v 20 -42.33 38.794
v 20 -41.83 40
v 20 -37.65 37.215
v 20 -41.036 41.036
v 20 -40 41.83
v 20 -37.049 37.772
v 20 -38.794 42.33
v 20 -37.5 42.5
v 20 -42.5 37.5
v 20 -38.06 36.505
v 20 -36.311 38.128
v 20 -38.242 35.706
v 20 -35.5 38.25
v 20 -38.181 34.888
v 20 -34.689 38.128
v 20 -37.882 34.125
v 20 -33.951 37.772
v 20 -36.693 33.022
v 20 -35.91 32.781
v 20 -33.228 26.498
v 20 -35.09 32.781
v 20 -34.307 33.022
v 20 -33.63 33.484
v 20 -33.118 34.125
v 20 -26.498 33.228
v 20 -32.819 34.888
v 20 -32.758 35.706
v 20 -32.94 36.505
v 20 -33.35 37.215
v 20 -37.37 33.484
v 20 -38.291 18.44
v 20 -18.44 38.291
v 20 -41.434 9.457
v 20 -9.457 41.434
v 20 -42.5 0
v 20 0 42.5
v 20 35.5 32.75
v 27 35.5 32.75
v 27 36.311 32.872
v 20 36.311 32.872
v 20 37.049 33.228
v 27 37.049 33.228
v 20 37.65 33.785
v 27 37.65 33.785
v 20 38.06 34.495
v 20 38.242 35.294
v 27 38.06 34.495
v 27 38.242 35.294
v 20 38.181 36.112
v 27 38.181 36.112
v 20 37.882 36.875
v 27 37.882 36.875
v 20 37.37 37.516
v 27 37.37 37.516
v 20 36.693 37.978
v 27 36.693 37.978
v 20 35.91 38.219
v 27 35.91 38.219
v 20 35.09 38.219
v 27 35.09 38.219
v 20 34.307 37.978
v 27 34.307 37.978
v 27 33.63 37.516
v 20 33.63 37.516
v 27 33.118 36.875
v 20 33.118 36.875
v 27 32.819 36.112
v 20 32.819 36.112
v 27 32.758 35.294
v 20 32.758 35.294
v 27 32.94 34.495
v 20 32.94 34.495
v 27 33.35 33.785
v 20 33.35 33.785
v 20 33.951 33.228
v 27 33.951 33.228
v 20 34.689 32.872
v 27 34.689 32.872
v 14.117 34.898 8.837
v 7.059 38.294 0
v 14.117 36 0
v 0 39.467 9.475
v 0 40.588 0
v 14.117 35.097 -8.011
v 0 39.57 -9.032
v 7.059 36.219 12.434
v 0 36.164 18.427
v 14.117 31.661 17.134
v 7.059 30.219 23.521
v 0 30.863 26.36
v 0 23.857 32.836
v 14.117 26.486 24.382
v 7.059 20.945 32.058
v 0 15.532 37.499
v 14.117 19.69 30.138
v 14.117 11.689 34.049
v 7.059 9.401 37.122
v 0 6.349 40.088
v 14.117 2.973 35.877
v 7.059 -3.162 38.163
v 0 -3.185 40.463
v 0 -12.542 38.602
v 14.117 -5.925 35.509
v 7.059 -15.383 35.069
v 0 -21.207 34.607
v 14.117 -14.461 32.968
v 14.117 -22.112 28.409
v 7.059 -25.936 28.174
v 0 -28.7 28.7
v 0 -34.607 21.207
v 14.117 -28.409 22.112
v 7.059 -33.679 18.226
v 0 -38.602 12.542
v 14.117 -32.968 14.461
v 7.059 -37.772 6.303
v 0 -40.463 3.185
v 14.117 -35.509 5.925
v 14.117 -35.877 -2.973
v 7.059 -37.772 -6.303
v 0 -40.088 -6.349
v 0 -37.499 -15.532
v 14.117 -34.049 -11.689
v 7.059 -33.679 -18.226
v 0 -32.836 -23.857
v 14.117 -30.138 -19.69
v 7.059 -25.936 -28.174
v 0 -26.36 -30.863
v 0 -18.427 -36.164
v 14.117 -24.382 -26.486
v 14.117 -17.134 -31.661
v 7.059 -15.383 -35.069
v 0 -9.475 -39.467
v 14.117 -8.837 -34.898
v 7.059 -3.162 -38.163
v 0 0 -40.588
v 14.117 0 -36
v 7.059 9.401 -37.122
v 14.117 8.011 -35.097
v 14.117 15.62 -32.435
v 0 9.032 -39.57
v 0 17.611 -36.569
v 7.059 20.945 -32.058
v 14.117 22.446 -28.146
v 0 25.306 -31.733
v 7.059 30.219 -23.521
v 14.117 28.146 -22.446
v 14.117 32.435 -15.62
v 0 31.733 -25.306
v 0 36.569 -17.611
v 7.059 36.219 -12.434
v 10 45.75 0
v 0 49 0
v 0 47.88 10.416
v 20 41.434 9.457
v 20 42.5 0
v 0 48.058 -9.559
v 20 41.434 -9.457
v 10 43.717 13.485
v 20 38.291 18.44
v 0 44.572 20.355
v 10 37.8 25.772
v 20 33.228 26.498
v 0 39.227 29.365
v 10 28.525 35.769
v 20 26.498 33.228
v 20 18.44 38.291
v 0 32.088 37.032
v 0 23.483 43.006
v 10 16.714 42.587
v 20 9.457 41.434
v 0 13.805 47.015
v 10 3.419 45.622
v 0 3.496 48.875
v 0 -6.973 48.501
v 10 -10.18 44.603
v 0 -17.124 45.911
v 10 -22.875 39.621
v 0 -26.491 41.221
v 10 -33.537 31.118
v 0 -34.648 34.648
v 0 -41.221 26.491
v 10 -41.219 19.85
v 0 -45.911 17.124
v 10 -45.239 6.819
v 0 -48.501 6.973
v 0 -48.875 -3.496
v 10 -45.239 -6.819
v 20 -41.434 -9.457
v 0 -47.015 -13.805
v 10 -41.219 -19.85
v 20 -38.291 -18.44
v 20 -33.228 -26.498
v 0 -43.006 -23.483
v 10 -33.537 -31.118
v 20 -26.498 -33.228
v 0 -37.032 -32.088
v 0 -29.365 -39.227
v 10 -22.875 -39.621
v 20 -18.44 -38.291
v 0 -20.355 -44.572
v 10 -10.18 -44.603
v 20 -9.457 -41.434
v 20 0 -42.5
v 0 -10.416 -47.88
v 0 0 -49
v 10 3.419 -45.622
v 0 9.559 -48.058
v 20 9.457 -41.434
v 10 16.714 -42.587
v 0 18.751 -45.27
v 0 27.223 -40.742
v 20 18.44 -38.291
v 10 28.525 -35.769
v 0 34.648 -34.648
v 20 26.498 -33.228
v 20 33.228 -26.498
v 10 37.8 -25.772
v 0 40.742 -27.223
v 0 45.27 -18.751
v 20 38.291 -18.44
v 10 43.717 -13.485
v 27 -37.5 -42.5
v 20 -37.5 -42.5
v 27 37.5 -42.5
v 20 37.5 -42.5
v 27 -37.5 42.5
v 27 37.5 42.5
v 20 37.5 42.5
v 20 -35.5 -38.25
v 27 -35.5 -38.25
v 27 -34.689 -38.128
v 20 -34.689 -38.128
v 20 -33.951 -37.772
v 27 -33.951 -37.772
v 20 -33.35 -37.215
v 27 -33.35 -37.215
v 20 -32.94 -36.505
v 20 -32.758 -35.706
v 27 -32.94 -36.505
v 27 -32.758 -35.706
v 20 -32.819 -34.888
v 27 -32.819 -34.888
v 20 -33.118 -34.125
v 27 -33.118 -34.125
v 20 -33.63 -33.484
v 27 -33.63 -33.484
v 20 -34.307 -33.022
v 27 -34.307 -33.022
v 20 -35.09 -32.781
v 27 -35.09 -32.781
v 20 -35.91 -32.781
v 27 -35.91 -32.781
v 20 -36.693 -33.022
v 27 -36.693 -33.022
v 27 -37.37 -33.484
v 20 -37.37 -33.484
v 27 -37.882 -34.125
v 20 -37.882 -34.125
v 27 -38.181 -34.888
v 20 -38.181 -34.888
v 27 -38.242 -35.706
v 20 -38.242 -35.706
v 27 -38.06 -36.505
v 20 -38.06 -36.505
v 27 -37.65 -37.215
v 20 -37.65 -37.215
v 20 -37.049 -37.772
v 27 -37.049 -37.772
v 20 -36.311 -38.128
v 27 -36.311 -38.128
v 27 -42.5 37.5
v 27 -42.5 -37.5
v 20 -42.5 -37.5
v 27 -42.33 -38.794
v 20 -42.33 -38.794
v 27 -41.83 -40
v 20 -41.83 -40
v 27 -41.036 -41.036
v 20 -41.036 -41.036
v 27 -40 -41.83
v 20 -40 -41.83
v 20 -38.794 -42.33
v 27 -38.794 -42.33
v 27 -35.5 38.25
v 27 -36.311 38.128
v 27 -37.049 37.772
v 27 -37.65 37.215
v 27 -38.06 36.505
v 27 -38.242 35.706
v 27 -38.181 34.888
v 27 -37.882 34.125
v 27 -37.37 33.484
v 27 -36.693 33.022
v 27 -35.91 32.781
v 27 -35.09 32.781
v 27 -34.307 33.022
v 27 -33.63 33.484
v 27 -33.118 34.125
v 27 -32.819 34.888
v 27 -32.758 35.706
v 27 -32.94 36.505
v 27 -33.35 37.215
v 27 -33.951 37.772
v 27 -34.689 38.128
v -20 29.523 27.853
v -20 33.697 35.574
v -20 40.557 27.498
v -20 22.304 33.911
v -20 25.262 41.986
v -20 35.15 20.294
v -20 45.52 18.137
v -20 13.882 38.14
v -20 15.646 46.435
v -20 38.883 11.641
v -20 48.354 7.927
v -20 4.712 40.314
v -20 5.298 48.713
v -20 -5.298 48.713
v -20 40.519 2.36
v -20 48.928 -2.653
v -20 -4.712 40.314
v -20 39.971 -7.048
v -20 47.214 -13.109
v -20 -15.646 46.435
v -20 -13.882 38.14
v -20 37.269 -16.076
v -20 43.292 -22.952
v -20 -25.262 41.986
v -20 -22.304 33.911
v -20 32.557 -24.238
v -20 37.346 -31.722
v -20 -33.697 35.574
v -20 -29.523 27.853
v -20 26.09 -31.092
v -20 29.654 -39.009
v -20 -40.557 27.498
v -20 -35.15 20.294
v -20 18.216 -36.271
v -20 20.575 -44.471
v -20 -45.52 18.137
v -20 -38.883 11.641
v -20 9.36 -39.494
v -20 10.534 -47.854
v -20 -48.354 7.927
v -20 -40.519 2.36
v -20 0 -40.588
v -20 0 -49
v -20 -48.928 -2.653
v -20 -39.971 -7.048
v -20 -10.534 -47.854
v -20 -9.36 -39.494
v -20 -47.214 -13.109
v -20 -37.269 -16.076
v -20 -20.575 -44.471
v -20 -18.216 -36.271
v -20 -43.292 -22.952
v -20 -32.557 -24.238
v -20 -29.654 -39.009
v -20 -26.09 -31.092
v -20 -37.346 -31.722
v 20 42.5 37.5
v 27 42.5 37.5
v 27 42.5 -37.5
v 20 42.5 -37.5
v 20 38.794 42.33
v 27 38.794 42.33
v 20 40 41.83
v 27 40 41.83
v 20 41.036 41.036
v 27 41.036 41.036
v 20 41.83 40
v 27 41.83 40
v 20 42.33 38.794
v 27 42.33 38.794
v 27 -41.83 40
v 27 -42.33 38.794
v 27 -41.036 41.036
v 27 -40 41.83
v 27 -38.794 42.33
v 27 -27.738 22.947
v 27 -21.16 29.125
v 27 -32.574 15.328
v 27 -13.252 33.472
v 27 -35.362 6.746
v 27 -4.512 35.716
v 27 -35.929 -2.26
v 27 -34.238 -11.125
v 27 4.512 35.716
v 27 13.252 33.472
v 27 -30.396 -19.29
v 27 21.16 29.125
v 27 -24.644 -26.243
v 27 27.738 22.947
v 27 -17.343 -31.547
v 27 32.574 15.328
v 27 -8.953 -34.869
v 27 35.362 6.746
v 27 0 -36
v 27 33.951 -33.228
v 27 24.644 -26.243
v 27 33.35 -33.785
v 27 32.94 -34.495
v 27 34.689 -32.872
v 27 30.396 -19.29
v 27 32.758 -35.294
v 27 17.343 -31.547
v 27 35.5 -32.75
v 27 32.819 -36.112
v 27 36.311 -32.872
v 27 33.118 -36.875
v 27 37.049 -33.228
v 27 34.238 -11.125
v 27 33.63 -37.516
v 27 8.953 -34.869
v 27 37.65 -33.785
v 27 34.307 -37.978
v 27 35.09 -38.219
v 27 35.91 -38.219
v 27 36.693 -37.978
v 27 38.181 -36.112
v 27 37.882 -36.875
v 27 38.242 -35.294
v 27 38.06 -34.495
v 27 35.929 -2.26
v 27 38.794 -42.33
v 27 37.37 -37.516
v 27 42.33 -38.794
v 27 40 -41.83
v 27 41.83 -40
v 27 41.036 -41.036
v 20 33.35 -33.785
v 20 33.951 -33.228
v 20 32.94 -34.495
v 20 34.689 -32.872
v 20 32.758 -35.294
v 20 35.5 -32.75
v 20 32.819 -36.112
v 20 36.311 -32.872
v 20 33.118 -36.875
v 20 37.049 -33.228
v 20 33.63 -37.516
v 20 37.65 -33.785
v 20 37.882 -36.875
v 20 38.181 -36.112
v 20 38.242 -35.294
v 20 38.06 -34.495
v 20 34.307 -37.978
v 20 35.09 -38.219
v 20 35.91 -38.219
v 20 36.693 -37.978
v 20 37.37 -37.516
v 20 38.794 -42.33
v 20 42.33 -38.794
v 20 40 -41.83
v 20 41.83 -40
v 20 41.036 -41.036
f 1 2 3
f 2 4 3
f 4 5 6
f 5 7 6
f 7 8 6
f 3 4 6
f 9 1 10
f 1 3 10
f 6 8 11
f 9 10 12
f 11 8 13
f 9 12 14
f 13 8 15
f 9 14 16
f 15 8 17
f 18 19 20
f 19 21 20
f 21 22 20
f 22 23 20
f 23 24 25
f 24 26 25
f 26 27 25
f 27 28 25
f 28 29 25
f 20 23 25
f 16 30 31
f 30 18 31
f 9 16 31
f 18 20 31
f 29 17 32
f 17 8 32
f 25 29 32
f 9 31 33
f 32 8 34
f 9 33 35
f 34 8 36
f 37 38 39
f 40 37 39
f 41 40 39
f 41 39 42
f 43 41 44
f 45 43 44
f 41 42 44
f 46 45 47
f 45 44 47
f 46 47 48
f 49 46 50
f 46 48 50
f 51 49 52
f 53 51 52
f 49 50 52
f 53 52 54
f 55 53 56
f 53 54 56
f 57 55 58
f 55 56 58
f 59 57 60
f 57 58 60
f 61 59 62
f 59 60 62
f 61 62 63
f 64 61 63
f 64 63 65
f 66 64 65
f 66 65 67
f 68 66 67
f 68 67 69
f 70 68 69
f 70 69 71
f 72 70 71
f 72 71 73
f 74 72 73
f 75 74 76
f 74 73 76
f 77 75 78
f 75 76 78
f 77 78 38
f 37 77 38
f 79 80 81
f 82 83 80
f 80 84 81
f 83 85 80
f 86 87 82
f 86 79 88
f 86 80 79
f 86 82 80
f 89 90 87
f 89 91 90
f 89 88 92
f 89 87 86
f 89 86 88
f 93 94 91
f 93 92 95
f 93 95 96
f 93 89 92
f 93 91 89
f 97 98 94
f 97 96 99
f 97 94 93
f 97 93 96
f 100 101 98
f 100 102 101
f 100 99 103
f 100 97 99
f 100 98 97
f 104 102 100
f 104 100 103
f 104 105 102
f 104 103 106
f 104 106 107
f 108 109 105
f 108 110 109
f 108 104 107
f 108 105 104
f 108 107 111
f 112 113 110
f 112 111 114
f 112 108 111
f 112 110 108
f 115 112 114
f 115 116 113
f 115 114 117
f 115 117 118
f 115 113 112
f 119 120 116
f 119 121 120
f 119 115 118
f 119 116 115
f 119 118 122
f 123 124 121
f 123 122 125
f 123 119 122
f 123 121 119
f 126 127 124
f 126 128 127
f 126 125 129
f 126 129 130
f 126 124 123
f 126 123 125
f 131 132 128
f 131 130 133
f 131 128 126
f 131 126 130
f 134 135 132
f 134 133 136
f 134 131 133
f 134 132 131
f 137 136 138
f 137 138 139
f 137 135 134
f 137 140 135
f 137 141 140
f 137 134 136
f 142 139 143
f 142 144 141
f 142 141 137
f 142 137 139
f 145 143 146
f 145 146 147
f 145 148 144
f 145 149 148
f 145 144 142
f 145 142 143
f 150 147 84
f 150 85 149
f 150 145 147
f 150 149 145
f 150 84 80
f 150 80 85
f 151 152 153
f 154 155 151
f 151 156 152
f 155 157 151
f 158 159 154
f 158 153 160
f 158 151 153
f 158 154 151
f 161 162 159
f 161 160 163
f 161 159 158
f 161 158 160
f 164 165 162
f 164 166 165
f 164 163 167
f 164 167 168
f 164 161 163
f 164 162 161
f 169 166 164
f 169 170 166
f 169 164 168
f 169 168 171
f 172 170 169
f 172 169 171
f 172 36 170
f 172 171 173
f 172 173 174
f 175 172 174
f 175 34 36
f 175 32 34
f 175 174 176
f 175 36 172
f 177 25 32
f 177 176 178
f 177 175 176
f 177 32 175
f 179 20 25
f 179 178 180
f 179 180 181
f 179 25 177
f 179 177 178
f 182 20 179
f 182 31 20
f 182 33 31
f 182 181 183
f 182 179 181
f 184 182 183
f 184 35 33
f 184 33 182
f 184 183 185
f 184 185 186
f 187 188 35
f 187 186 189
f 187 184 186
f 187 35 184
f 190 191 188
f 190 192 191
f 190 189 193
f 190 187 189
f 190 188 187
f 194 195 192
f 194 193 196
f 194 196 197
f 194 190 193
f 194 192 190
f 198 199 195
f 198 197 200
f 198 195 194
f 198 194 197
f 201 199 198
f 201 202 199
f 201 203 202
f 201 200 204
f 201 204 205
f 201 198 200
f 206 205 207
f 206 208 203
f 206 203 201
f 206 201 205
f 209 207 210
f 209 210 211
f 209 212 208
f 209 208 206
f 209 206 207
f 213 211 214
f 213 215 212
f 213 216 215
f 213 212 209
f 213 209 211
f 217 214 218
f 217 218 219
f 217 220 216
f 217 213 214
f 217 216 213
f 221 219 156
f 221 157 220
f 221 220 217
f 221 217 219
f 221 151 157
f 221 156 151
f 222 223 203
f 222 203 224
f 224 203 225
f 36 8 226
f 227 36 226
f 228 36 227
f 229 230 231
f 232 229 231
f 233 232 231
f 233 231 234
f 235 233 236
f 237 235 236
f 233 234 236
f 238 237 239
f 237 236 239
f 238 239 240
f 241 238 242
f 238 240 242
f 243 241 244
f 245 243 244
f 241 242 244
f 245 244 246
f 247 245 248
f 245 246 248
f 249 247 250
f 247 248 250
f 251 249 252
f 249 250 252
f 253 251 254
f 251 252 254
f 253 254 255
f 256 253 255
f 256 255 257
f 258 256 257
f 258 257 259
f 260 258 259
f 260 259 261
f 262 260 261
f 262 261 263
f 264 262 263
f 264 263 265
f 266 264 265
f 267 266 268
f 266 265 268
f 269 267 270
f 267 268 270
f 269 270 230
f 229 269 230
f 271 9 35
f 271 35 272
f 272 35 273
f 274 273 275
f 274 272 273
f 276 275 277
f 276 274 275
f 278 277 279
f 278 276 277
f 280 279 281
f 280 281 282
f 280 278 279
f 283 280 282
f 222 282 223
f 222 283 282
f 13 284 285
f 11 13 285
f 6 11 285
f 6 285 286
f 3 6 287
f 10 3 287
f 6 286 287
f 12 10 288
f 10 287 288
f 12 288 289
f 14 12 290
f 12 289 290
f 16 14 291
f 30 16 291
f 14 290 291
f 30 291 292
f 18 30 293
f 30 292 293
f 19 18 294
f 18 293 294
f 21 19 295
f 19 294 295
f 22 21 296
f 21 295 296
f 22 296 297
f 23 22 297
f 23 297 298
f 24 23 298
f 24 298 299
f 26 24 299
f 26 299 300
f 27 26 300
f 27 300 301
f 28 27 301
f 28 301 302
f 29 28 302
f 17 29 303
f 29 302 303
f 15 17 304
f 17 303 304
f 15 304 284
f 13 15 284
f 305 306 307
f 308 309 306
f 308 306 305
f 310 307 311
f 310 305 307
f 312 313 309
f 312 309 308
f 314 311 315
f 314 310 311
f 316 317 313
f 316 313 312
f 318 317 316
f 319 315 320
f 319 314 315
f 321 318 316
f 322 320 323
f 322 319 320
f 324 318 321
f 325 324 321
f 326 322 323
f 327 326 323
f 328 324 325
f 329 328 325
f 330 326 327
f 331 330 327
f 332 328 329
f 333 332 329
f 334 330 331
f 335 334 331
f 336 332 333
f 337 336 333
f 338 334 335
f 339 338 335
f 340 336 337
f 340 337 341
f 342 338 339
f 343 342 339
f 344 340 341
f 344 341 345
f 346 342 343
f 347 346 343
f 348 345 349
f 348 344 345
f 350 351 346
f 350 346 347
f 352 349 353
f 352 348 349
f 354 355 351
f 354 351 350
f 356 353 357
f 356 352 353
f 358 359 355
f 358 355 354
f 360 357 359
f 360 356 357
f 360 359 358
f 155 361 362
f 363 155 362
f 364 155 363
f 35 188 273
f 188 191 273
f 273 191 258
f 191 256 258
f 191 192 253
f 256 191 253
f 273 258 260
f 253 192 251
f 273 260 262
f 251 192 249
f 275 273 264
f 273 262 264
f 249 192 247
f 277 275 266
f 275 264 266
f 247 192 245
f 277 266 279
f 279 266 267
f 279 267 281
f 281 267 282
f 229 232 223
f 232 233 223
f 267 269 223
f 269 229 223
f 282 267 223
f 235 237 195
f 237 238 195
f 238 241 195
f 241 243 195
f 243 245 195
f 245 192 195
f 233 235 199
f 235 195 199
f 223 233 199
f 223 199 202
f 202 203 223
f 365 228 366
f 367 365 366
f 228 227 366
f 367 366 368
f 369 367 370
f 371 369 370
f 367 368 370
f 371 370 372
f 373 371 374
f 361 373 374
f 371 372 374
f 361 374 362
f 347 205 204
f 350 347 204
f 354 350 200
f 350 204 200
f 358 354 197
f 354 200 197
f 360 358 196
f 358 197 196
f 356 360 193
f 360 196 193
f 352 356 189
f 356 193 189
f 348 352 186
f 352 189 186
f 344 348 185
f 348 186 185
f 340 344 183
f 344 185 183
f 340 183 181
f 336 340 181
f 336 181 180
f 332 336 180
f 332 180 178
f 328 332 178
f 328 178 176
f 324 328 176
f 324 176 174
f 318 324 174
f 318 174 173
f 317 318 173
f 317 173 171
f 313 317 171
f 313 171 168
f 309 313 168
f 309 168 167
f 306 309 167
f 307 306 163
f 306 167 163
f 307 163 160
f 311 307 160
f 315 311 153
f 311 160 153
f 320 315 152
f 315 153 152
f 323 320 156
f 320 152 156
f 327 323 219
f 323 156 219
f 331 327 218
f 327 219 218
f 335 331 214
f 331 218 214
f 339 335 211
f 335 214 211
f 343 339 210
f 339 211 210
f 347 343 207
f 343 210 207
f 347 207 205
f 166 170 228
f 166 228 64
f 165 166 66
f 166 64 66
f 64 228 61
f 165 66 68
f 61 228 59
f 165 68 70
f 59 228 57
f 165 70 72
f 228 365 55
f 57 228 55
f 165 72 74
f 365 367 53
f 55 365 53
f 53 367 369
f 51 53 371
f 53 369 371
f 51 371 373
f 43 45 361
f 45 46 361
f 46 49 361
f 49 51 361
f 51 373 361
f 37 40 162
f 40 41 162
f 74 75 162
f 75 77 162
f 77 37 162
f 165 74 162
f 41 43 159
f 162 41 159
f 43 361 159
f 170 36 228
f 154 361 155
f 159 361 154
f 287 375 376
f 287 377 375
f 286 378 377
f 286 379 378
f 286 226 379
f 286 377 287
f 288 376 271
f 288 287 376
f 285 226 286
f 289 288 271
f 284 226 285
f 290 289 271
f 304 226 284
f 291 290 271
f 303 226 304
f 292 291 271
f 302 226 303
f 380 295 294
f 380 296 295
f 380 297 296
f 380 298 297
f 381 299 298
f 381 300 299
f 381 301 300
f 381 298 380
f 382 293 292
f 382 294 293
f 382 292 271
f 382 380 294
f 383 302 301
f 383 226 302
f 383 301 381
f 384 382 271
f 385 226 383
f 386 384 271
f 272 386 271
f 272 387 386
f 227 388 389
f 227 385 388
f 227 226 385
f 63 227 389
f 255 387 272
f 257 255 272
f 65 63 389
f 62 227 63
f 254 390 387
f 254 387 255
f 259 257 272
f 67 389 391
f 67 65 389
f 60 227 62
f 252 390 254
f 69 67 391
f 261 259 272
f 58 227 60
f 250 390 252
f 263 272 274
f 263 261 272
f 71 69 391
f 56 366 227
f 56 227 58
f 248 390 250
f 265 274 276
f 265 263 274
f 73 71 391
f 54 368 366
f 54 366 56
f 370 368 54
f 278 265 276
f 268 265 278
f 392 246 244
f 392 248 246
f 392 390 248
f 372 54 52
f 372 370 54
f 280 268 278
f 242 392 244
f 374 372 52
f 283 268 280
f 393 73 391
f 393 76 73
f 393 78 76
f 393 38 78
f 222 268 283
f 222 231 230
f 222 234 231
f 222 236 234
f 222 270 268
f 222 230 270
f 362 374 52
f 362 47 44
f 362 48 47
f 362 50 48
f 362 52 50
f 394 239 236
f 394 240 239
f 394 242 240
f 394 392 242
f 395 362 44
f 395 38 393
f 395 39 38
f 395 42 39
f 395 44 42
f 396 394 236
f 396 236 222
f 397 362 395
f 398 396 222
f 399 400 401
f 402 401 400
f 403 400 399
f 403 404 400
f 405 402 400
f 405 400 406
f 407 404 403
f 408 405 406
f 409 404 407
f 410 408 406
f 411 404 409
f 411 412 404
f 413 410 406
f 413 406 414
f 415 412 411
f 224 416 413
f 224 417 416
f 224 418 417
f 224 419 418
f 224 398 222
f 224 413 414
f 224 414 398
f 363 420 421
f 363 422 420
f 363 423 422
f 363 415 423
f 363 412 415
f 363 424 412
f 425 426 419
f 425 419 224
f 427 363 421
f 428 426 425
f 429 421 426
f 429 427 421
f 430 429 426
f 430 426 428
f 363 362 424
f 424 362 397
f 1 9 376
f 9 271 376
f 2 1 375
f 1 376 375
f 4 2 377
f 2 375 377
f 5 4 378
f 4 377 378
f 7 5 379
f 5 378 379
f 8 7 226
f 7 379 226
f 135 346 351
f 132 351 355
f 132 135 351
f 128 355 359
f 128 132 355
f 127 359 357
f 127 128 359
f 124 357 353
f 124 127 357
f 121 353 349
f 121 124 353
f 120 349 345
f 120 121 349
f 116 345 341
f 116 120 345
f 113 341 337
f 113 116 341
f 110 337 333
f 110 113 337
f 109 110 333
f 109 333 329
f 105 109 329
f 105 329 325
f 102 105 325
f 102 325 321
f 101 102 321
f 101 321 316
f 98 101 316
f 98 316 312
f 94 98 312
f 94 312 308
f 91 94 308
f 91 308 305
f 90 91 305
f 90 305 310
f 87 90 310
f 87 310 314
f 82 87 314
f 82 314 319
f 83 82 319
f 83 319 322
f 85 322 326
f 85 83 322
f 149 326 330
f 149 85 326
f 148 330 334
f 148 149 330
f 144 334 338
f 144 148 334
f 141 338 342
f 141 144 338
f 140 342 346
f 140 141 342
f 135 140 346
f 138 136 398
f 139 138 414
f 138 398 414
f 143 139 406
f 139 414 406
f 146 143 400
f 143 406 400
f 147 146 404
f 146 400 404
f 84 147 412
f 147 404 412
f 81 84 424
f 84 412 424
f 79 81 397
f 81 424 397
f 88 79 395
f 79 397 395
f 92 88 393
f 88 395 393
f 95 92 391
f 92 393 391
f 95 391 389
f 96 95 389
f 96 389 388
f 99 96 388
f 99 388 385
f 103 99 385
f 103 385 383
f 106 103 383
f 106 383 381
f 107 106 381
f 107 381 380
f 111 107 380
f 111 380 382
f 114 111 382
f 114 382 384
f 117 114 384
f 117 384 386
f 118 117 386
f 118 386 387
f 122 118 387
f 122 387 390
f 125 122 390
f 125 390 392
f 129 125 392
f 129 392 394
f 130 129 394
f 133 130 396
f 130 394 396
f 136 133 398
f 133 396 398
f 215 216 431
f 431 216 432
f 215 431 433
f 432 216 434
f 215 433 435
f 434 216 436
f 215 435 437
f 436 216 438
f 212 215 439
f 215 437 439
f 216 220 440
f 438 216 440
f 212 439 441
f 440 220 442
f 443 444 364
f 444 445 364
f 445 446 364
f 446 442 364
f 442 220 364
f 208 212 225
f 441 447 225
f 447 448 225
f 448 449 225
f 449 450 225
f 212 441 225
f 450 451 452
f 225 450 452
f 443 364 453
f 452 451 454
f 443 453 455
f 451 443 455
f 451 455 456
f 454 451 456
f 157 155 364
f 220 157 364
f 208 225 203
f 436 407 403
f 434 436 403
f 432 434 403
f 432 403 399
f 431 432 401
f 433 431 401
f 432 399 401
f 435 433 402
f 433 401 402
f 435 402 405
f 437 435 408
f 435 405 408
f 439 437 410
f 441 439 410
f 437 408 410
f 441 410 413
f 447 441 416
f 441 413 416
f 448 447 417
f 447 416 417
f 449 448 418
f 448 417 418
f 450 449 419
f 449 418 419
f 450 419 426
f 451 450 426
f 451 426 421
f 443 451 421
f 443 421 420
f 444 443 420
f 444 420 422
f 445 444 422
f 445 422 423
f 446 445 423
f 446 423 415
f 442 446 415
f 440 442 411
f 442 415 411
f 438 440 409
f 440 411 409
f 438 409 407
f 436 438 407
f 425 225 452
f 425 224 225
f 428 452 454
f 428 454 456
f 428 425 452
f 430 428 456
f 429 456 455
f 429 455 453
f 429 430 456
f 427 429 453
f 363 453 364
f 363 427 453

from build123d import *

# Parameters (mm, degrees)
SKETCH23_W          = 85
SKETCH23_H          = 85
BOSS_EXTRUDE1_DEPTH = 7
SKETCH26_R          = 49
SKETCH26_R_2        = 40.588103662
BOSS_EXTRUDE2_DEPTH = 20
SKETCH28_R          = 36
CUT_EXTRUDE5_DEPTH  = 84.731714422
SKETCH29_R          = 2.75
CUT_EXTRUDE6_DEPTH  = 7
FILLET1_R           = 5
FILLET2_R           = 5


# Read off the part's stored shape, not the designer's step: Loft-Thin1
with BuildPart() as part:
    # Loft-Thin1 outline → Loft-Thin1 (revolve)
    with BuildSketch(Plane.YX):
        Polygon((34.088103662, 20), (40.588103662, 0), (49, 0), (42.5, 20), align=None)
    revolve(axis=Axis((0, 0, 0), (1, 0, 0)))

    # Sketch23 → Boss-Extrude1 (add)
    with BuildSketch(Plane(origin=(20, 0, 0), x_dir=(0, 0, -1), z_dir=(1, 0, 0))):
        Rectangle(SKETCH23_W, SKETCH23_H)
    extrude(amount=BOSS_EXTRUDE1_DEPTH)

    # Sketch26 → Boss-Extrude2 (add)
    with BuildSketch(Plane.ZY):
        with Locations(Location((0, 0, 0), (0, 0, 180))):
            Circle(SKETCH26_R)
        with Locations(Location((0, 0, 0), (0, 0, 180))):
            Circle(SKETCH26_R_2, mode=Mode.SUBTRACT)
    extrude(amount=BOSS_EXTRUDE2_DEPTH)

    # Sketch28 → Cut-Extrude5 (cut, through all)
    with BuildSketch(Plane(origin=(27, 0, 0), x_dir=(0, 0, -1), z_dir=(1, 0, 0))):
        Circle(SKETCH28_R)
    extrude(amount=-CUT_EXTRUDE5_DEPTH, mode=Mode.SUBTRACT)

    # Sketch29 → Cut-Extrude6 (cut)
    with BuildSketch(Plane(origin=(27, 0, 0), x_dir=(0, 0, -1), z_dir=(1, 0, 0))):
        with Locations((-35.5, 35.5)):
            Circle(SKETCH29_R)
        with Locations(Location((35.5, 35.5, 0), (0, 0, 180))):
            Circle(SKETCH29_R)
        with Locations(Location((-35.5, -35.5, 0), (0, 0, 180))):
            Circle(SKETCH29_R)
        with Locations((35.5, -35.5)):
            Circle(SKETCH29_R)
    extrude(amount=-CUT_EXTRUDE6_DEPTH, mode=Mode.SUBTRACT)

    # Fillet1
    fillet1_edges = [part.edges().sort_by_distance(p)[0] for p in [
        (23.5, -42.5, -42.5),
    ]]
    fillet(fillet1_edges, radius=FILLET1_R)

    # Fillet2
    fillet2_edges = [part.edges().sort_by_distance(p)[0] for p in [
        (23.5, -42.5, 42.5),
        (23.5, 42.5, 42.5),
        (23.5, 42.5, -42.5),
    ]]
    fillet(fillet2_edges, radius=FILLET2_R)


solid = part.part
